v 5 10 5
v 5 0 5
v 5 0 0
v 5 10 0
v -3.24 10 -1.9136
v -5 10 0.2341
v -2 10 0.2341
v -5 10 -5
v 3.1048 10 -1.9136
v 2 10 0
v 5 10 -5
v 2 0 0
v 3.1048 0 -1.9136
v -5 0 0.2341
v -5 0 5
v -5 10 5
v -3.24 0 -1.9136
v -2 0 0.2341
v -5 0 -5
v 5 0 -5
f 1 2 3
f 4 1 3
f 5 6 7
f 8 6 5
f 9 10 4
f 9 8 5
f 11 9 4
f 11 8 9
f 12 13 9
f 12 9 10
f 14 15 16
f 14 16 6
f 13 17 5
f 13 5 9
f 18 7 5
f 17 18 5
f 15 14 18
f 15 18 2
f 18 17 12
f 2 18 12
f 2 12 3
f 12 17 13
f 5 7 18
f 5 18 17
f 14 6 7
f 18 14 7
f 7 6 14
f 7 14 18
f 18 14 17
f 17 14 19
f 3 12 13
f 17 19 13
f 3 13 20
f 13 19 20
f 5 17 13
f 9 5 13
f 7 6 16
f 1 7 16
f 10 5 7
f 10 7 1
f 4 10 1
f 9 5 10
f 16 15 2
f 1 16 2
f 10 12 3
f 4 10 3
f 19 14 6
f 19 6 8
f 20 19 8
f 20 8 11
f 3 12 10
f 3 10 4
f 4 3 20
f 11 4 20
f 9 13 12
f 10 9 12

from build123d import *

# Parameters (mm, degrees)
SKETCH1_W              = 10
SKETCH1_H              = 10
BOSS_EXTRUDE1_DEPTH    = 10
SPLIT2_SURFACE_1_BACK  = 18.321
SPLIT2_SURFACE_1_DEPTH = 36.642
SPLIT2_SURFACE_2_BACK  = 18.321
SPLIT2_SURFACE_2_DEPTH = 36.642


with BuildPart() as part:
    # Sketch1 → Boss-Extrude1 (new body)
    with BuildSketch(Plane(origin=(0, 0, 0), x_dir=(1, 0, 0), z_dir=(0, 1, 0))):
        Rectangle(SKETCH1_W, SKETCH1_H)
    extrude(amount=BOSS_EXTRUDE1_DEPTH)


with BuildPart() as body_2:
    # Split2: the piece behind the surface
    add(part.part)
    # Split2 surface: a surface, the sketch's curves swept straight by 36.642 mm
    with BuildLine(Plane(origin=(0, 10, 0), x_dir=(1, 0, 0), z_dir=(0, 1, 0)).offset(-SPLIT2_SURFACE_1_BACK), mode=Mode.PRIVATE) as split2_surface_1_path:
        Line((-5, -0.234054964), (-2, -0.234054964))
        Line((-2, -0.234054964), (-3.239958467, 1.9136161))
        Line((-3.239958467, 1.9136161), (3.104826771, 1.9136161))
        Line((3.104826771, 1.9136161), (2, 0))
        Line((2, 0), (5, 0))
        Line((5, 0), (5, -5))
        Line((5, -5), (-5, -5))
        Line((-5, -5), (-5, -0.234054964))
    split2_surface_1 = Shell.extrude(split2_surface_1_path.wire(), (0 * SPLIT2_SURFACE_1_DEPTH, 1 * SPLIT2_SURFACE_1_DEPTH, 0 * SPLIT2_SURFACE_1_DEPTH))
    split(bisect_by=split2_surface_1, keep=Keep.BOTTOM)


with BuildPart() as part_1:
    add(part.part)

    # Split2: split by a surface, the side it looks to stays
    # Split2 surface: a surface, the sketch's curves swept straight by 36.642 mm
    with BuildLine(Plane(origin=(0, 10, 0), x_dir=(1, 0, 0), z_dir=(0, 1, 0)).offset(-SPLIT2_SURFACE_2_BACK), mode=Mode.PRIVATE) as split2_surface_2_path:
        Line((-5, -0.234054964), (-2, -0.234054964))
        Line((-2, -0.234054964), (-3.239958467, 1.9136161))
        Line((-3.239958467, 1.9136161), (3.104826771, 1.9136161))
        Line((3.104826771, 1.9136161), (2, 0))
        Line((2, 0), (5, 0))
        Line((5, 0), (5, -5))
        Line((5, -5), (-5, -5))
        Line((-5, -5), (-5, -0.234054964))
    split2_surface_2 = Shell.extrude(split2_surface_2_path.wire(), (0 * SPLIT2_SURFACE_2_DEPTH, 1 * SPLIT2_SURFACE_2_DEPTH, 0 * SPLIT2_SURFACE_2_DEPTH))
    split(bisect_by=split2_surface_2, keep=Keep.TOP)


solid = Compound([body_2.part, part_1.part])
